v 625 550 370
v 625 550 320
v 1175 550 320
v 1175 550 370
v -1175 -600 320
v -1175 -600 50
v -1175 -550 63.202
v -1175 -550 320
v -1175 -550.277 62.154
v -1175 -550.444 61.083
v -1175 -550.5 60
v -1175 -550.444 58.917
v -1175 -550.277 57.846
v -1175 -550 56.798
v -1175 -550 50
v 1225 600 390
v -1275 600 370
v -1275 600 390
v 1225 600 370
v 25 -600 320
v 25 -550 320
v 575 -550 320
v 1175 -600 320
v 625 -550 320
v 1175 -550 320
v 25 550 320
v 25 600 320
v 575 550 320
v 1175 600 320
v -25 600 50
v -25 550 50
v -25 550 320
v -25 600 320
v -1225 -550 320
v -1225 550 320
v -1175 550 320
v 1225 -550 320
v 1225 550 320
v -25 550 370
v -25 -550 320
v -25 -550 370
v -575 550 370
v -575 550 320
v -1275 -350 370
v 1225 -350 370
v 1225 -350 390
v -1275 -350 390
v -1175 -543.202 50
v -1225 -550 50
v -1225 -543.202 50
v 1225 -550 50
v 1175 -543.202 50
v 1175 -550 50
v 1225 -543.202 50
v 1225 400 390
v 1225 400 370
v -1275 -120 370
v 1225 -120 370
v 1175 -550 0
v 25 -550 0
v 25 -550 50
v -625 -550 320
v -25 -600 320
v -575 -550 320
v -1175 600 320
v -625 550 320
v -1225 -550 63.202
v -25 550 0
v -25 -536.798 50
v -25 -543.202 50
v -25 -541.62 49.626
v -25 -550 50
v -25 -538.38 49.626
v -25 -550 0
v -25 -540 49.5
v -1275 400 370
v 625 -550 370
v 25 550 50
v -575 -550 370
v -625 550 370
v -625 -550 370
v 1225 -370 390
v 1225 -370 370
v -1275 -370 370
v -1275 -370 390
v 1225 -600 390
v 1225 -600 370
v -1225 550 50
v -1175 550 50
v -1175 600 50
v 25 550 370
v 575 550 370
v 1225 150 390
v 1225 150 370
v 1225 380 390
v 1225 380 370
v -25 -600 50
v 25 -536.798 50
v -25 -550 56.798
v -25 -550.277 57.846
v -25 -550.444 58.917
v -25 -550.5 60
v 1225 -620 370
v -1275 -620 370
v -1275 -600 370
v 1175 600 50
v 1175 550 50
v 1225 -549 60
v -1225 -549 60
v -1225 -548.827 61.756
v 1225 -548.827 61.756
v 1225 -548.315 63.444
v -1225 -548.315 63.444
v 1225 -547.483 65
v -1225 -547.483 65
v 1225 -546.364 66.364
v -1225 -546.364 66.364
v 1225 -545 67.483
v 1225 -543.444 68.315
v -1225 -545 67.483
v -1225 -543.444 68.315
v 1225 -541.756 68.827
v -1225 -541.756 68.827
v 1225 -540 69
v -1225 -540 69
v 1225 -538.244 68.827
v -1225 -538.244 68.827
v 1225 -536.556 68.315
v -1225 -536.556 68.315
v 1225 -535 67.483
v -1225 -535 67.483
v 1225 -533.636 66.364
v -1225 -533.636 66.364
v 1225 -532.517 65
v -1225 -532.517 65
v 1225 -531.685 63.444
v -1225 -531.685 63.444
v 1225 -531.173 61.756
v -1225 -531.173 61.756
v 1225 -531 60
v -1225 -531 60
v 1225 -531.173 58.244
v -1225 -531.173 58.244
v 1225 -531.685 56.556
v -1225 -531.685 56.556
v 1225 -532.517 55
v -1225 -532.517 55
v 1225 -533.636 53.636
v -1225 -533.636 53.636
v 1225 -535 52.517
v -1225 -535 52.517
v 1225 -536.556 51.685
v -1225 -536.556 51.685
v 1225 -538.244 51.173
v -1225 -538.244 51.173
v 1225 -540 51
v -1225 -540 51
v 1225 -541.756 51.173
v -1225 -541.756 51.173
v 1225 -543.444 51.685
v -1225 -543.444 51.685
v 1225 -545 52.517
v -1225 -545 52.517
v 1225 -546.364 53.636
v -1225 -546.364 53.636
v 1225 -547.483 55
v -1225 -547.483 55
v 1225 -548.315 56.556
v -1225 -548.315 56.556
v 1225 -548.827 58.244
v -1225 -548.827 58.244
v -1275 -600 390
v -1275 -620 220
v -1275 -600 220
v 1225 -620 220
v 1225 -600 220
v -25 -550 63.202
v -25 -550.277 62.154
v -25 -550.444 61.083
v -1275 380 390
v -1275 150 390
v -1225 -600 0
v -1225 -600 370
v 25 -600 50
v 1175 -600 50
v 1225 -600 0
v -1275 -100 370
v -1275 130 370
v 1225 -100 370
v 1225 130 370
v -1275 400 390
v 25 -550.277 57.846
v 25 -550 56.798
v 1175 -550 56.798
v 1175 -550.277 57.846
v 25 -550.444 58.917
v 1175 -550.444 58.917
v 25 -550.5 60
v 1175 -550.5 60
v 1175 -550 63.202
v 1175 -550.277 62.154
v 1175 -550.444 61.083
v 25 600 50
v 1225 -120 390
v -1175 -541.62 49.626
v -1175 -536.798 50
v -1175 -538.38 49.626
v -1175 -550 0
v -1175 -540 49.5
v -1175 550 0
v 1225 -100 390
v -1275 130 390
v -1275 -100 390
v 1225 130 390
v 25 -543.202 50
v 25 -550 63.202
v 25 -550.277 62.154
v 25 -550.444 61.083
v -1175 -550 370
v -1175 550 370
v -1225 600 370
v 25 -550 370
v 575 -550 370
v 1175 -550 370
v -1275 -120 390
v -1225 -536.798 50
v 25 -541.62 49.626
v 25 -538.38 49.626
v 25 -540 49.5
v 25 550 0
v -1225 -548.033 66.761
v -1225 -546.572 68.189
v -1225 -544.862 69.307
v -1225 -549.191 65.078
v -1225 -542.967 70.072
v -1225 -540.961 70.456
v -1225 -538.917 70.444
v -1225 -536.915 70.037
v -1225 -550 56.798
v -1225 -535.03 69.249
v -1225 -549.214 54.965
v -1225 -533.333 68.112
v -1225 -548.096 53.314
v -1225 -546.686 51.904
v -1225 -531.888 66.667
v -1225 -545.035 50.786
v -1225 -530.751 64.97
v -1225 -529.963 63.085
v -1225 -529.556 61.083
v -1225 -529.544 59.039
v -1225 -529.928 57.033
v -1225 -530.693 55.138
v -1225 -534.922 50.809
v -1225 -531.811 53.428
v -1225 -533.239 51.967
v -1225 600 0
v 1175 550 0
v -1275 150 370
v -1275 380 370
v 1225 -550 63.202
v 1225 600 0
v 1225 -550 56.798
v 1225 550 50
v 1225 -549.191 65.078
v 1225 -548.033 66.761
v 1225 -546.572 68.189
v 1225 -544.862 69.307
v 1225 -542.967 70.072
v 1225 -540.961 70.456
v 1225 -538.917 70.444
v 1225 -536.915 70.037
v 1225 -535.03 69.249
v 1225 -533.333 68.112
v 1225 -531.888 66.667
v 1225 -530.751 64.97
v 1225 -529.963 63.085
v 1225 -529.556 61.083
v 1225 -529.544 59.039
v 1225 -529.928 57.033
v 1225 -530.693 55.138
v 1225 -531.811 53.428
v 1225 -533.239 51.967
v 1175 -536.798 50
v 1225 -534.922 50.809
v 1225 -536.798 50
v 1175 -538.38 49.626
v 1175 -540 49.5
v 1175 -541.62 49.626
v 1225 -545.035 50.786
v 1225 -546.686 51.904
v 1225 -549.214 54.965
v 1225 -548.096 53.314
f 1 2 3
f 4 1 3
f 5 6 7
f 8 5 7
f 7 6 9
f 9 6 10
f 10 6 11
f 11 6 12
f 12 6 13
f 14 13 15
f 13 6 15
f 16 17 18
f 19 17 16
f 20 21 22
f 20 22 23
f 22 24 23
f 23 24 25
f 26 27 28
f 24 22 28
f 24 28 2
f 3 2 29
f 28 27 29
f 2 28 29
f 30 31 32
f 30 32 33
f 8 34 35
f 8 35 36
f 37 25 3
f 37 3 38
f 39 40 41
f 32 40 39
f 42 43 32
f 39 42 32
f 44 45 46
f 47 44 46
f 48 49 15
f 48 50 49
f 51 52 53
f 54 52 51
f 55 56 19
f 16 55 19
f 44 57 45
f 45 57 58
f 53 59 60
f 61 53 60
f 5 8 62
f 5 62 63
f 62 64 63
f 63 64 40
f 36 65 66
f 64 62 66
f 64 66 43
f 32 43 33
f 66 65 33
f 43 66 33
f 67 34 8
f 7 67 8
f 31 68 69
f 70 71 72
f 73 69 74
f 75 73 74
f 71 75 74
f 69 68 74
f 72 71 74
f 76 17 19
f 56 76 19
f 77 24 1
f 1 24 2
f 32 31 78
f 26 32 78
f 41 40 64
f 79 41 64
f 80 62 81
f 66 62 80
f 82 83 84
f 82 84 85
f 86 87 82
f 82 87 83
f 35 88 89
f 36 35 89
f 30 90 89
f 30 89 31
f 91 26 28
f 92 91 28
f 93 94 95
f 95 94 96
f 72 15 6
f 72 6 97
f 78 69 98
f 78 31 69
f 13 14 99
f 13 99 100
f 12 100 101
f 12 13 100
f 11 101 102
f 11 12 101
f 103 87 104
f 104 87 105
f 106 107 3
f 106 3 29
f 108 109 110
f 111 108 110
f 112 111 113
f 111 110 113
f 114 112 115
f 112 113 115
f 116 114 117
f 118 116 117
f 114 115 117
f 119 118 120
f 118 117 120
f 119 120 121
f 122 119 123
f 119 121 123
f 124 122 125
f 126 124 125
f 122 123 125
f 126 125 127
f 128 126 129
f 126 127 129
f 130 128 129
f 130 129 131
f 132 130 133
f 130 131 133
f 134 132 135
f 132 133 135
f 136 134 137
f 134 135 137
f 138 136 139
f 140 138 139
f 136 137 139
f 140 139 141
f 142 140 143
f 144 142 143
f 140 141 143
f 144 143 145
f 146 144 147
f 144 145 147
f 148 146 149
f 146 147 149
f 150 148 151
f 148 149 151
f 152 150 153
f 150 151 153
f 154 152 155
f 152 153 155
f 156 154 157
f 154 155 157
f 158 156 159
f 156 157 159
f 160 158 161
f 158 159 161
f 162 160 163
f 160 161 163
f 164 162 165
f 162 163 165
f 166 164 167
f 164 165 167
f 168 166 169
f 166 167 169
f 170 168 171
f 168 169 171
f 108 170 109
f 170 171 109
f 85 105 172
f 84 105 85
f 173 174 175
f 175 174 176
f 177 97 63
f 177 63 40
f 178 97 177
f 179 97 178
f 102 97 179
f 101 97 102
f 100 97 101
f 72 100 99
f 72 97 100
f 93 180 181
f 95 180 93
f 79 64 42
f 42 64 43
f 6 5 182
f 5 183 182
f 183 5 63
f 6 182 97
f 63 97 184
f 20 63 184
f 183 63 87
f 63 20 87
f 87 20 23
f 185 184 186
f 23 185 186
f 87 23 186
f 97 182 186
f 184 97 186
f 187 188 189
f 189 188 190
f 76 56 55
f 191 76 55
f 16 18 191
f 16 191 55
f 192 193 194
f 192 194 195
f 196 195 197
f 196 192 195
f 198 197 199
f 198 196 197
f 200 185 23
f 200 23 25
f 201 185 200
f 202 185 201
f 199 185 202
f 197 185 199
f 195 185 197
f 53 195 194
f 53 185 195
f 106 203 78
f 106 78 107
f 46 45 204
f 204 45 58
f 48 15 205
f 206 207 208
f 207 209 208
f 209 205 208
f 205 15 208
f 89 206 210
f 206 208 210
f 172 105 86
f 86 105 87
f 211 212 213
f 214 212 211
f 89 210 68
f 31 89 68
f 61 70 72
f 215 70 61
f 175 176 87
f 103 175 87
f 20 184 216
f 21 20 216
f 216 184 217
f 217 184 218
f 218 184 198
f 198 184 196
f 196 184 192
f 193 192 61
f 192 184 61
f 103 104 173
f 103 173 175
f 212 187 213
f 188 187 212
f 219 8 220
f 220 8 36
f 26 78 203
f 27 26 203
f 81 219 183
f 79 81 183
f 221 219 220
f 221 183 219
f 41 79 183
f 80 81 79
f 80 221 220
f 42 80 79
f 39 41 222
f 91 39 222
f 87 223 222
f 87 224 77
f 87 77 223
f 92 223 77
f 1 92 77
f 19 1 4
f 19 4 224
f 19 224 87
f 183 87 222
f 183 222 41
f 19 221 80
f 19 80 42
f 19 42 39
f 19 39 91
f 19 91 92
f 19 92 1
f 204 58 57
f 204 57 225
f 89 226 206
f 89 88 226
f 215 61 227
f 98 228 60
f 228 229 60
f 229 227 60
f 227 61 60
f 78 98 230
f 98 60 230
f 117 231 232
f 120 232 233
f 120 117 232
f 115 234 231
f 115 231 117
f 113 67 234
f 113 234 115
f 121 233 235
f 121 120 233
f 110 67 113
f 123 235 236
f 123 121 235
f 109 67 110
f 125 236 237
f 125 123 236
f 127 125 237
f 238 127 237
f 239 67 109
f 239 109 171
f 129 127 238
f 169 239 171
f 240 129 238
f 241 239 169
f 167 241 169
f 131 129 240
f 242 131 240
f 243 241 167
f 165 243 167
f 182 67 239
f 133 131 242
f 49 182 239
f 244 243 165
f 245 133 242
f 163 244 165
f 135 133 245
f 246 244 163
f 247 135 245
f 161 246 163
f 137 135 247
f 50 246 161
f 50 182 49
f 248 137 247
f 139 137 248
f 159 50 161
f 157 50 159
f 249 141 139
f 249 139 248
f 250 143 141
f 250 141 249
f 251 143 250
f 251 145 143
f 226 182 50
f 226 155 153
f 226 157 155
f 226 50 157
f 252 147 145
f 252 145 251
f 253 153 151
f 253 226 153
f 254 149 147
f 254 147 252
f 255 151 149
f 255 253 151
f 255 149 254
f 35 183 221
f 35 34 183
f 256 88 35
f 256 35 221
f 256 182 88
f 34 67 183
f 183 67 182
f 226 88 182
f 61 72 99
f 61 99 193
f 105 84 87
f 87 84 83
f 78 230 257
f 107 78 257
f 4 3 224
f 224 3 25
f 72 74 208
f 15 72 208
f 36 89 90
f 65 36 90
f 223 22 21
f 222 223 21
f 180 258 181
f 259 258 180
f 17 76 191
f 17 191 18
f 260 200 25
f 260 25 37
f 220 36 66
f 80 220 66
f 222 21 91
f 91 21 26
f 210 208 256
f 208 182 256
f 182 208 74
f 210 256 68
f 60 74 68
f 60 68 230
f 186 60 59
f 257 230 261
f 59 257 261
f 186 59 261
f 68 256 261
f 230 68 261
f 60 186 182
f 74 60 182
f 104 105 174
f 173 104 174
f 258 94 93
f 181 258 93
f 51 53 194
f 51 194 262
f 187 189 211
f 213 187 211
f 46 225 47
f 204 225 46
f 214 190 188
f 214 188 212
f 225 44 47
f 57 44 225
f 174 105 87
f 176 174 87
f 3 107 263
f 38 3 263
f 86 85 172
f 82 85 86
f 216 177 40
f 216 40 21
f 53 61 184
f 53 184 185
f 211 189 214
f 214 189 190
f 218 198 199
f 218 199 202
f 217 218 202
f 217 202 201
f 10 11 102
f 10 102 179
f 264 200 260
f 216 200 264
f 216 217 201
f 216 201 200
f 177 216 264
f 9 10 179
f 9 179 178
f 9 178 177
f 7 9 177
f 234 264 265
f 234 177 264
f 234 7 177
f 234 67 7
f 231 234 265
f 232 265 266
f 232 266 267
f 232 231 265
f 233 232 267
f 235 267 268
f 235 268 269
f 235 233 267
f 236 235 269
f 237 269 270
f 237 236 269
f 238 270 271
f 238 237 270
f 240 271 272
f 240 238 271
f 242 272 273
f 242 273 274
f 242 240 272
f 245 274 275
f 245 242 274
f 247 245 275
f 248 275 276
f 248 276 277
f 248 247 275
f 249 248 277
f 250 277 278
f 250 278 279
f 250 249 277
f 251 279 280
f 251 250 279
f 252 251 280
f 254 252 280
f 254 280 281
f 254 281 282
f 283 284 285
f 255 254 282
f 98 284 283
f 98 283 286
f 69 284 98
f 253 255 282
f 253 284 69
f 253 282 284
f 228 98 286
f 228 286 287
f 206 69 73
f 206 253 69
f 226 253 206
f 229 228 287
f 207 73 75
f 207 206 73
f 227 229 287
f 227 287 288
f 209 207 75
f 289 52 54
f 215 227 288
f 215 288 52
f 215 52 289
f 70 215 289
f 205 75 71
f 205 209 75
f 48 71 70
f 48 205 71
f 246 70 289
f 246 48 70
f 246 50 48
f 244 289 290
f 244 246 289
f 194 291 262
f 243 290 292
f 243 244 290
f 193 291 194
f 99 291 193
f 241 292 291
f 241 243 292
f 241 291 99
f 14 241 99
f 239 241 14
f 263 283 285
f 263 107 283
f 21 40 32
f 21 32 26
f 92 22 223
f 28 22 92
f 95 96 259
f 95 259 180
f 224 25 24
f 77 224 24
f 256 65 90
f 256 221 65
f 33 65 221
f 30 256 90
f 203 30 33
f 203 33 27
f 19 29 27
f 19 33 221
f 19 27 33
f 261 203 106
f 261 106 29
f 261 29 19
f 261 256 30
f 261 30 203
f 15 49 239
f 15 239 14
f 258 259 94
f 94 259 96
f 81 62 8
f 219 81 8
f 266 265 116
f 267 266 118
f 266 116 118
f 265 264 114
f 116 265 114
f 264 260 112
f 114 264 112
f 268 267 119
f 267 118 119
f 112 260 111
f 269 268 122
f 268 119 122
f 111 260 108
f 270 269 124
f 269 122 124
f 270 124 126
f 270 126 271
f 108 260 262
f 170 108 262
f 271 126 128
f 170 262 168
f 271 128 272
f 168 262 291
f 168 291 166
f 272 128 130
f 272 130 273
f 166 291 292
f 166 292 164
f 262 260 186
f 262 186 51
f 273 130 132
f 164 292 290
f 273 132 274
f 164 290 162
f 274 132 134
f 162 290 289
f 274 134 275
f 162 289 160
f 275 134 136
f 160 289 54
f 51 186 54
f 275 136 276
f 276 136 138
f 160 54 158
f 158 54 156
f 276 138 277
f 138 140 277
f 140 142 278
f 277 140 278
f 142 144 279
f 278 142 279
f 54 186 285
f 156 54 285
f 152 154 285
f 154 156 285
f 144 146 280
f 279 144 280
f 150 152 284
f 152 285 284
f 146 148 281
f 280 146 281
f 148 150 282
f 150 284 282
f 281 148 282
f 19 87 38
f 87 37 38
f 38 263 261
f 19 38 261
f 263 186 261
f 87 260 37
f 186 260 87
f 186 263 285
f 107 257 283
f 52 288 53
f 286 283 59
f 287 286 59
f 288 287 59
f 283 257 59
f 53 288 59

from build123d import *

# Parameters (mm, degrees)
F0_W      = 50
F0_H      = 50
F0_H_2    = 1100
F1_DEPTH  = 50
F2_W      = 50
F2_H      = 50
F3_DEPTH  = 270
F4_W      = 2450
F4_H      = 1200
F4_W_2    = 25
F4_H_2    = 1100
F4_W_3    = 50
F5_DEPTH  = 50
F6_R      = 9
F7_DEPTH  = 2450
F9_DEPTH  = 20
F10_W     = 2500
F10_H     = 1200
F11_DEPTH = 20
F12_W     = 20
F12_H     = 20
F13_DEPTH = 2500


with BuildPart() as f1:
    # F0 (on Top) → F1 (new body)
    with BuildSketch(Plane.XY):
        with Locations((1200, -575)):
            Rectangle(F0_W, F0_H)
        Polygon((-1175, -600), (1175, -600), (1175, -550), (25, -550), (0, -550), (-25, -550), (-1175, -550), align=None)
        with Locations((1200, 0)):
            Rectangle(F0_W, F0_H_2)
        with Locations((-1200, -575)):
            Rectangle(F0_W, F0_H)
        with Locations((1200, 575)):
            Rectangle(F0_W, F0_H)
        with Locations((-1200, 0)):
            Rectangle(F0_W, F0_H_2)
        Polygon((25, 550), (1175, 550), (1175, 600), (-1175, 600), (-1175, 550), (-25, 550), (0, 550), align=None)
        with Locations((-1200, 575)):
            Rectangle(F0_W, F0_H)
        Polygon((0, -550), (25, -550), (25, 0), (25, 550), (0, 550), (0, 0), align=None)
        Polygon((-25, 0), (-25, -550), (0, -550), (0, 0), (0, 550), (-25, 550), align=None)
    extrude(amount=F1_DEPTH)

    # F2 (on face) → F3 (join)
    with BuildSketch(Plane.XY.offset(50)):
        with Locations((0, 575)):
            Rectangle(F2_W, F2_H)
        with Locations((-1200, 575)):
            Rectangle(F2_W, F2_H)
        with Locations((-1200, -575)):
            Rectangle(F2_W, F2_H)
        with Locations((0, -575)):
            Rectangle(F2_W, F2_H)
        with Locations((1200, -575)):
            Rectangle(F2_W, F2_H)
        with Locations((1200, 575)):
            Rectangle(F2_W, F2_H)
    extrude(amount=F3_DEPTH)

    # F4 (on face) → F5 (join)
    with BuildSketch(Plane.XY.offset(320)):
        Rectangle(F4_W, F4_H)
        Polygon((1175, 550), (1175, -550), (625, -550), (600, -550), (575, -550), (25, -550), (-25, -550), (-575, -550), (-600, -550), (-625, -550), (-1175, -550), (-1175, 550), (-625, 550), (-600, 550), (-575, 550), (-25, 550), (25, 550), (575, 550), (600, 550), (625, 550), align=None, mode=Mode.SUBTRACT)
        with Locations((-587.5, 0)):
            Rectangle(F4_W_2, F4_H_2)
        with Locations((-612.5, 0)):
            Rectangle(F4_W_2, F4_H_2)
        with Locations((612.5, 0)):
            Rectangle(F4_W_2, F4_H_2)
        with Locations((587.5, 0)):
            Rectangle(F4_W_2, F4_H_2)
        Rectangle(F4_W_3, F4_H_2)
    extrude(amount=F5_DEPTH)

    # F6 (on face) → F7 (join)
    with BuildSketch(Plane(origin=(-1225, 0, 0), x_dir=(0, -1, 0), z_dir=(-1, 0, 0))):
        with Locations((540, 60)):
            Circle(F6_R)
        with BuildLine():
            ThreePointArc((550.5, 60), (529.625753, 61.620185), (550, 56.798438))
            ThreePointArc((550, 56.798438), (550.374247, 58.379815), (550.5, 60))
        make_face()
        with Locations((540, 60)):
            Circle(F6_R, mode=Mode.SUBTRACT)
    extrude(amount=-F7_DEPTH)


with BuildPart() as f9:
    # F8 (on face) → F9 (new body)
    with BuildSketch(Plane.XZ.offset(600)):
        Polygon((1225, 220), (1225, 370), (-1225, 370), (-1275, 370), (-1275, 220), align=None)
    extrude(amount=F9_DEPTH)


with BuildPart() as f11:
    # F10 (on face) → F11 (new body)
    with BuildSketch(Plane.XY.offset(370)):
        with Locations((-25, 0)):
            Rectangle(F10_W, F10_H)
    extrude(amount=F11_DEPTH)

    # F12 (on face) → F13 (cut, through all)
    with BuildSketch(Plane(origin=(-1275, 0, 0), x_dir=(0, -1, 0), z_dir=(-1, 0, 0))):
        with Locations((610, 380)):
            Rectangle(F12_W, F12_H)
        with Locations((360, 380)):
            Rectangle(F12_W, F12_H)
        with Locations((110, 380)):
            Rectangle(F12_W, F12_H)
        with Locations((-140, 380)):
            Rectangle(F12_W, F12_H)
        with Locations((-390, 380)):
            Rectangle(F12_W, F12_H)
    extrude(amount=-F13_DEPTH, mode=Mode.SUBTRACT)


solid = Compound([f1.part, f9.part, f11.part])
